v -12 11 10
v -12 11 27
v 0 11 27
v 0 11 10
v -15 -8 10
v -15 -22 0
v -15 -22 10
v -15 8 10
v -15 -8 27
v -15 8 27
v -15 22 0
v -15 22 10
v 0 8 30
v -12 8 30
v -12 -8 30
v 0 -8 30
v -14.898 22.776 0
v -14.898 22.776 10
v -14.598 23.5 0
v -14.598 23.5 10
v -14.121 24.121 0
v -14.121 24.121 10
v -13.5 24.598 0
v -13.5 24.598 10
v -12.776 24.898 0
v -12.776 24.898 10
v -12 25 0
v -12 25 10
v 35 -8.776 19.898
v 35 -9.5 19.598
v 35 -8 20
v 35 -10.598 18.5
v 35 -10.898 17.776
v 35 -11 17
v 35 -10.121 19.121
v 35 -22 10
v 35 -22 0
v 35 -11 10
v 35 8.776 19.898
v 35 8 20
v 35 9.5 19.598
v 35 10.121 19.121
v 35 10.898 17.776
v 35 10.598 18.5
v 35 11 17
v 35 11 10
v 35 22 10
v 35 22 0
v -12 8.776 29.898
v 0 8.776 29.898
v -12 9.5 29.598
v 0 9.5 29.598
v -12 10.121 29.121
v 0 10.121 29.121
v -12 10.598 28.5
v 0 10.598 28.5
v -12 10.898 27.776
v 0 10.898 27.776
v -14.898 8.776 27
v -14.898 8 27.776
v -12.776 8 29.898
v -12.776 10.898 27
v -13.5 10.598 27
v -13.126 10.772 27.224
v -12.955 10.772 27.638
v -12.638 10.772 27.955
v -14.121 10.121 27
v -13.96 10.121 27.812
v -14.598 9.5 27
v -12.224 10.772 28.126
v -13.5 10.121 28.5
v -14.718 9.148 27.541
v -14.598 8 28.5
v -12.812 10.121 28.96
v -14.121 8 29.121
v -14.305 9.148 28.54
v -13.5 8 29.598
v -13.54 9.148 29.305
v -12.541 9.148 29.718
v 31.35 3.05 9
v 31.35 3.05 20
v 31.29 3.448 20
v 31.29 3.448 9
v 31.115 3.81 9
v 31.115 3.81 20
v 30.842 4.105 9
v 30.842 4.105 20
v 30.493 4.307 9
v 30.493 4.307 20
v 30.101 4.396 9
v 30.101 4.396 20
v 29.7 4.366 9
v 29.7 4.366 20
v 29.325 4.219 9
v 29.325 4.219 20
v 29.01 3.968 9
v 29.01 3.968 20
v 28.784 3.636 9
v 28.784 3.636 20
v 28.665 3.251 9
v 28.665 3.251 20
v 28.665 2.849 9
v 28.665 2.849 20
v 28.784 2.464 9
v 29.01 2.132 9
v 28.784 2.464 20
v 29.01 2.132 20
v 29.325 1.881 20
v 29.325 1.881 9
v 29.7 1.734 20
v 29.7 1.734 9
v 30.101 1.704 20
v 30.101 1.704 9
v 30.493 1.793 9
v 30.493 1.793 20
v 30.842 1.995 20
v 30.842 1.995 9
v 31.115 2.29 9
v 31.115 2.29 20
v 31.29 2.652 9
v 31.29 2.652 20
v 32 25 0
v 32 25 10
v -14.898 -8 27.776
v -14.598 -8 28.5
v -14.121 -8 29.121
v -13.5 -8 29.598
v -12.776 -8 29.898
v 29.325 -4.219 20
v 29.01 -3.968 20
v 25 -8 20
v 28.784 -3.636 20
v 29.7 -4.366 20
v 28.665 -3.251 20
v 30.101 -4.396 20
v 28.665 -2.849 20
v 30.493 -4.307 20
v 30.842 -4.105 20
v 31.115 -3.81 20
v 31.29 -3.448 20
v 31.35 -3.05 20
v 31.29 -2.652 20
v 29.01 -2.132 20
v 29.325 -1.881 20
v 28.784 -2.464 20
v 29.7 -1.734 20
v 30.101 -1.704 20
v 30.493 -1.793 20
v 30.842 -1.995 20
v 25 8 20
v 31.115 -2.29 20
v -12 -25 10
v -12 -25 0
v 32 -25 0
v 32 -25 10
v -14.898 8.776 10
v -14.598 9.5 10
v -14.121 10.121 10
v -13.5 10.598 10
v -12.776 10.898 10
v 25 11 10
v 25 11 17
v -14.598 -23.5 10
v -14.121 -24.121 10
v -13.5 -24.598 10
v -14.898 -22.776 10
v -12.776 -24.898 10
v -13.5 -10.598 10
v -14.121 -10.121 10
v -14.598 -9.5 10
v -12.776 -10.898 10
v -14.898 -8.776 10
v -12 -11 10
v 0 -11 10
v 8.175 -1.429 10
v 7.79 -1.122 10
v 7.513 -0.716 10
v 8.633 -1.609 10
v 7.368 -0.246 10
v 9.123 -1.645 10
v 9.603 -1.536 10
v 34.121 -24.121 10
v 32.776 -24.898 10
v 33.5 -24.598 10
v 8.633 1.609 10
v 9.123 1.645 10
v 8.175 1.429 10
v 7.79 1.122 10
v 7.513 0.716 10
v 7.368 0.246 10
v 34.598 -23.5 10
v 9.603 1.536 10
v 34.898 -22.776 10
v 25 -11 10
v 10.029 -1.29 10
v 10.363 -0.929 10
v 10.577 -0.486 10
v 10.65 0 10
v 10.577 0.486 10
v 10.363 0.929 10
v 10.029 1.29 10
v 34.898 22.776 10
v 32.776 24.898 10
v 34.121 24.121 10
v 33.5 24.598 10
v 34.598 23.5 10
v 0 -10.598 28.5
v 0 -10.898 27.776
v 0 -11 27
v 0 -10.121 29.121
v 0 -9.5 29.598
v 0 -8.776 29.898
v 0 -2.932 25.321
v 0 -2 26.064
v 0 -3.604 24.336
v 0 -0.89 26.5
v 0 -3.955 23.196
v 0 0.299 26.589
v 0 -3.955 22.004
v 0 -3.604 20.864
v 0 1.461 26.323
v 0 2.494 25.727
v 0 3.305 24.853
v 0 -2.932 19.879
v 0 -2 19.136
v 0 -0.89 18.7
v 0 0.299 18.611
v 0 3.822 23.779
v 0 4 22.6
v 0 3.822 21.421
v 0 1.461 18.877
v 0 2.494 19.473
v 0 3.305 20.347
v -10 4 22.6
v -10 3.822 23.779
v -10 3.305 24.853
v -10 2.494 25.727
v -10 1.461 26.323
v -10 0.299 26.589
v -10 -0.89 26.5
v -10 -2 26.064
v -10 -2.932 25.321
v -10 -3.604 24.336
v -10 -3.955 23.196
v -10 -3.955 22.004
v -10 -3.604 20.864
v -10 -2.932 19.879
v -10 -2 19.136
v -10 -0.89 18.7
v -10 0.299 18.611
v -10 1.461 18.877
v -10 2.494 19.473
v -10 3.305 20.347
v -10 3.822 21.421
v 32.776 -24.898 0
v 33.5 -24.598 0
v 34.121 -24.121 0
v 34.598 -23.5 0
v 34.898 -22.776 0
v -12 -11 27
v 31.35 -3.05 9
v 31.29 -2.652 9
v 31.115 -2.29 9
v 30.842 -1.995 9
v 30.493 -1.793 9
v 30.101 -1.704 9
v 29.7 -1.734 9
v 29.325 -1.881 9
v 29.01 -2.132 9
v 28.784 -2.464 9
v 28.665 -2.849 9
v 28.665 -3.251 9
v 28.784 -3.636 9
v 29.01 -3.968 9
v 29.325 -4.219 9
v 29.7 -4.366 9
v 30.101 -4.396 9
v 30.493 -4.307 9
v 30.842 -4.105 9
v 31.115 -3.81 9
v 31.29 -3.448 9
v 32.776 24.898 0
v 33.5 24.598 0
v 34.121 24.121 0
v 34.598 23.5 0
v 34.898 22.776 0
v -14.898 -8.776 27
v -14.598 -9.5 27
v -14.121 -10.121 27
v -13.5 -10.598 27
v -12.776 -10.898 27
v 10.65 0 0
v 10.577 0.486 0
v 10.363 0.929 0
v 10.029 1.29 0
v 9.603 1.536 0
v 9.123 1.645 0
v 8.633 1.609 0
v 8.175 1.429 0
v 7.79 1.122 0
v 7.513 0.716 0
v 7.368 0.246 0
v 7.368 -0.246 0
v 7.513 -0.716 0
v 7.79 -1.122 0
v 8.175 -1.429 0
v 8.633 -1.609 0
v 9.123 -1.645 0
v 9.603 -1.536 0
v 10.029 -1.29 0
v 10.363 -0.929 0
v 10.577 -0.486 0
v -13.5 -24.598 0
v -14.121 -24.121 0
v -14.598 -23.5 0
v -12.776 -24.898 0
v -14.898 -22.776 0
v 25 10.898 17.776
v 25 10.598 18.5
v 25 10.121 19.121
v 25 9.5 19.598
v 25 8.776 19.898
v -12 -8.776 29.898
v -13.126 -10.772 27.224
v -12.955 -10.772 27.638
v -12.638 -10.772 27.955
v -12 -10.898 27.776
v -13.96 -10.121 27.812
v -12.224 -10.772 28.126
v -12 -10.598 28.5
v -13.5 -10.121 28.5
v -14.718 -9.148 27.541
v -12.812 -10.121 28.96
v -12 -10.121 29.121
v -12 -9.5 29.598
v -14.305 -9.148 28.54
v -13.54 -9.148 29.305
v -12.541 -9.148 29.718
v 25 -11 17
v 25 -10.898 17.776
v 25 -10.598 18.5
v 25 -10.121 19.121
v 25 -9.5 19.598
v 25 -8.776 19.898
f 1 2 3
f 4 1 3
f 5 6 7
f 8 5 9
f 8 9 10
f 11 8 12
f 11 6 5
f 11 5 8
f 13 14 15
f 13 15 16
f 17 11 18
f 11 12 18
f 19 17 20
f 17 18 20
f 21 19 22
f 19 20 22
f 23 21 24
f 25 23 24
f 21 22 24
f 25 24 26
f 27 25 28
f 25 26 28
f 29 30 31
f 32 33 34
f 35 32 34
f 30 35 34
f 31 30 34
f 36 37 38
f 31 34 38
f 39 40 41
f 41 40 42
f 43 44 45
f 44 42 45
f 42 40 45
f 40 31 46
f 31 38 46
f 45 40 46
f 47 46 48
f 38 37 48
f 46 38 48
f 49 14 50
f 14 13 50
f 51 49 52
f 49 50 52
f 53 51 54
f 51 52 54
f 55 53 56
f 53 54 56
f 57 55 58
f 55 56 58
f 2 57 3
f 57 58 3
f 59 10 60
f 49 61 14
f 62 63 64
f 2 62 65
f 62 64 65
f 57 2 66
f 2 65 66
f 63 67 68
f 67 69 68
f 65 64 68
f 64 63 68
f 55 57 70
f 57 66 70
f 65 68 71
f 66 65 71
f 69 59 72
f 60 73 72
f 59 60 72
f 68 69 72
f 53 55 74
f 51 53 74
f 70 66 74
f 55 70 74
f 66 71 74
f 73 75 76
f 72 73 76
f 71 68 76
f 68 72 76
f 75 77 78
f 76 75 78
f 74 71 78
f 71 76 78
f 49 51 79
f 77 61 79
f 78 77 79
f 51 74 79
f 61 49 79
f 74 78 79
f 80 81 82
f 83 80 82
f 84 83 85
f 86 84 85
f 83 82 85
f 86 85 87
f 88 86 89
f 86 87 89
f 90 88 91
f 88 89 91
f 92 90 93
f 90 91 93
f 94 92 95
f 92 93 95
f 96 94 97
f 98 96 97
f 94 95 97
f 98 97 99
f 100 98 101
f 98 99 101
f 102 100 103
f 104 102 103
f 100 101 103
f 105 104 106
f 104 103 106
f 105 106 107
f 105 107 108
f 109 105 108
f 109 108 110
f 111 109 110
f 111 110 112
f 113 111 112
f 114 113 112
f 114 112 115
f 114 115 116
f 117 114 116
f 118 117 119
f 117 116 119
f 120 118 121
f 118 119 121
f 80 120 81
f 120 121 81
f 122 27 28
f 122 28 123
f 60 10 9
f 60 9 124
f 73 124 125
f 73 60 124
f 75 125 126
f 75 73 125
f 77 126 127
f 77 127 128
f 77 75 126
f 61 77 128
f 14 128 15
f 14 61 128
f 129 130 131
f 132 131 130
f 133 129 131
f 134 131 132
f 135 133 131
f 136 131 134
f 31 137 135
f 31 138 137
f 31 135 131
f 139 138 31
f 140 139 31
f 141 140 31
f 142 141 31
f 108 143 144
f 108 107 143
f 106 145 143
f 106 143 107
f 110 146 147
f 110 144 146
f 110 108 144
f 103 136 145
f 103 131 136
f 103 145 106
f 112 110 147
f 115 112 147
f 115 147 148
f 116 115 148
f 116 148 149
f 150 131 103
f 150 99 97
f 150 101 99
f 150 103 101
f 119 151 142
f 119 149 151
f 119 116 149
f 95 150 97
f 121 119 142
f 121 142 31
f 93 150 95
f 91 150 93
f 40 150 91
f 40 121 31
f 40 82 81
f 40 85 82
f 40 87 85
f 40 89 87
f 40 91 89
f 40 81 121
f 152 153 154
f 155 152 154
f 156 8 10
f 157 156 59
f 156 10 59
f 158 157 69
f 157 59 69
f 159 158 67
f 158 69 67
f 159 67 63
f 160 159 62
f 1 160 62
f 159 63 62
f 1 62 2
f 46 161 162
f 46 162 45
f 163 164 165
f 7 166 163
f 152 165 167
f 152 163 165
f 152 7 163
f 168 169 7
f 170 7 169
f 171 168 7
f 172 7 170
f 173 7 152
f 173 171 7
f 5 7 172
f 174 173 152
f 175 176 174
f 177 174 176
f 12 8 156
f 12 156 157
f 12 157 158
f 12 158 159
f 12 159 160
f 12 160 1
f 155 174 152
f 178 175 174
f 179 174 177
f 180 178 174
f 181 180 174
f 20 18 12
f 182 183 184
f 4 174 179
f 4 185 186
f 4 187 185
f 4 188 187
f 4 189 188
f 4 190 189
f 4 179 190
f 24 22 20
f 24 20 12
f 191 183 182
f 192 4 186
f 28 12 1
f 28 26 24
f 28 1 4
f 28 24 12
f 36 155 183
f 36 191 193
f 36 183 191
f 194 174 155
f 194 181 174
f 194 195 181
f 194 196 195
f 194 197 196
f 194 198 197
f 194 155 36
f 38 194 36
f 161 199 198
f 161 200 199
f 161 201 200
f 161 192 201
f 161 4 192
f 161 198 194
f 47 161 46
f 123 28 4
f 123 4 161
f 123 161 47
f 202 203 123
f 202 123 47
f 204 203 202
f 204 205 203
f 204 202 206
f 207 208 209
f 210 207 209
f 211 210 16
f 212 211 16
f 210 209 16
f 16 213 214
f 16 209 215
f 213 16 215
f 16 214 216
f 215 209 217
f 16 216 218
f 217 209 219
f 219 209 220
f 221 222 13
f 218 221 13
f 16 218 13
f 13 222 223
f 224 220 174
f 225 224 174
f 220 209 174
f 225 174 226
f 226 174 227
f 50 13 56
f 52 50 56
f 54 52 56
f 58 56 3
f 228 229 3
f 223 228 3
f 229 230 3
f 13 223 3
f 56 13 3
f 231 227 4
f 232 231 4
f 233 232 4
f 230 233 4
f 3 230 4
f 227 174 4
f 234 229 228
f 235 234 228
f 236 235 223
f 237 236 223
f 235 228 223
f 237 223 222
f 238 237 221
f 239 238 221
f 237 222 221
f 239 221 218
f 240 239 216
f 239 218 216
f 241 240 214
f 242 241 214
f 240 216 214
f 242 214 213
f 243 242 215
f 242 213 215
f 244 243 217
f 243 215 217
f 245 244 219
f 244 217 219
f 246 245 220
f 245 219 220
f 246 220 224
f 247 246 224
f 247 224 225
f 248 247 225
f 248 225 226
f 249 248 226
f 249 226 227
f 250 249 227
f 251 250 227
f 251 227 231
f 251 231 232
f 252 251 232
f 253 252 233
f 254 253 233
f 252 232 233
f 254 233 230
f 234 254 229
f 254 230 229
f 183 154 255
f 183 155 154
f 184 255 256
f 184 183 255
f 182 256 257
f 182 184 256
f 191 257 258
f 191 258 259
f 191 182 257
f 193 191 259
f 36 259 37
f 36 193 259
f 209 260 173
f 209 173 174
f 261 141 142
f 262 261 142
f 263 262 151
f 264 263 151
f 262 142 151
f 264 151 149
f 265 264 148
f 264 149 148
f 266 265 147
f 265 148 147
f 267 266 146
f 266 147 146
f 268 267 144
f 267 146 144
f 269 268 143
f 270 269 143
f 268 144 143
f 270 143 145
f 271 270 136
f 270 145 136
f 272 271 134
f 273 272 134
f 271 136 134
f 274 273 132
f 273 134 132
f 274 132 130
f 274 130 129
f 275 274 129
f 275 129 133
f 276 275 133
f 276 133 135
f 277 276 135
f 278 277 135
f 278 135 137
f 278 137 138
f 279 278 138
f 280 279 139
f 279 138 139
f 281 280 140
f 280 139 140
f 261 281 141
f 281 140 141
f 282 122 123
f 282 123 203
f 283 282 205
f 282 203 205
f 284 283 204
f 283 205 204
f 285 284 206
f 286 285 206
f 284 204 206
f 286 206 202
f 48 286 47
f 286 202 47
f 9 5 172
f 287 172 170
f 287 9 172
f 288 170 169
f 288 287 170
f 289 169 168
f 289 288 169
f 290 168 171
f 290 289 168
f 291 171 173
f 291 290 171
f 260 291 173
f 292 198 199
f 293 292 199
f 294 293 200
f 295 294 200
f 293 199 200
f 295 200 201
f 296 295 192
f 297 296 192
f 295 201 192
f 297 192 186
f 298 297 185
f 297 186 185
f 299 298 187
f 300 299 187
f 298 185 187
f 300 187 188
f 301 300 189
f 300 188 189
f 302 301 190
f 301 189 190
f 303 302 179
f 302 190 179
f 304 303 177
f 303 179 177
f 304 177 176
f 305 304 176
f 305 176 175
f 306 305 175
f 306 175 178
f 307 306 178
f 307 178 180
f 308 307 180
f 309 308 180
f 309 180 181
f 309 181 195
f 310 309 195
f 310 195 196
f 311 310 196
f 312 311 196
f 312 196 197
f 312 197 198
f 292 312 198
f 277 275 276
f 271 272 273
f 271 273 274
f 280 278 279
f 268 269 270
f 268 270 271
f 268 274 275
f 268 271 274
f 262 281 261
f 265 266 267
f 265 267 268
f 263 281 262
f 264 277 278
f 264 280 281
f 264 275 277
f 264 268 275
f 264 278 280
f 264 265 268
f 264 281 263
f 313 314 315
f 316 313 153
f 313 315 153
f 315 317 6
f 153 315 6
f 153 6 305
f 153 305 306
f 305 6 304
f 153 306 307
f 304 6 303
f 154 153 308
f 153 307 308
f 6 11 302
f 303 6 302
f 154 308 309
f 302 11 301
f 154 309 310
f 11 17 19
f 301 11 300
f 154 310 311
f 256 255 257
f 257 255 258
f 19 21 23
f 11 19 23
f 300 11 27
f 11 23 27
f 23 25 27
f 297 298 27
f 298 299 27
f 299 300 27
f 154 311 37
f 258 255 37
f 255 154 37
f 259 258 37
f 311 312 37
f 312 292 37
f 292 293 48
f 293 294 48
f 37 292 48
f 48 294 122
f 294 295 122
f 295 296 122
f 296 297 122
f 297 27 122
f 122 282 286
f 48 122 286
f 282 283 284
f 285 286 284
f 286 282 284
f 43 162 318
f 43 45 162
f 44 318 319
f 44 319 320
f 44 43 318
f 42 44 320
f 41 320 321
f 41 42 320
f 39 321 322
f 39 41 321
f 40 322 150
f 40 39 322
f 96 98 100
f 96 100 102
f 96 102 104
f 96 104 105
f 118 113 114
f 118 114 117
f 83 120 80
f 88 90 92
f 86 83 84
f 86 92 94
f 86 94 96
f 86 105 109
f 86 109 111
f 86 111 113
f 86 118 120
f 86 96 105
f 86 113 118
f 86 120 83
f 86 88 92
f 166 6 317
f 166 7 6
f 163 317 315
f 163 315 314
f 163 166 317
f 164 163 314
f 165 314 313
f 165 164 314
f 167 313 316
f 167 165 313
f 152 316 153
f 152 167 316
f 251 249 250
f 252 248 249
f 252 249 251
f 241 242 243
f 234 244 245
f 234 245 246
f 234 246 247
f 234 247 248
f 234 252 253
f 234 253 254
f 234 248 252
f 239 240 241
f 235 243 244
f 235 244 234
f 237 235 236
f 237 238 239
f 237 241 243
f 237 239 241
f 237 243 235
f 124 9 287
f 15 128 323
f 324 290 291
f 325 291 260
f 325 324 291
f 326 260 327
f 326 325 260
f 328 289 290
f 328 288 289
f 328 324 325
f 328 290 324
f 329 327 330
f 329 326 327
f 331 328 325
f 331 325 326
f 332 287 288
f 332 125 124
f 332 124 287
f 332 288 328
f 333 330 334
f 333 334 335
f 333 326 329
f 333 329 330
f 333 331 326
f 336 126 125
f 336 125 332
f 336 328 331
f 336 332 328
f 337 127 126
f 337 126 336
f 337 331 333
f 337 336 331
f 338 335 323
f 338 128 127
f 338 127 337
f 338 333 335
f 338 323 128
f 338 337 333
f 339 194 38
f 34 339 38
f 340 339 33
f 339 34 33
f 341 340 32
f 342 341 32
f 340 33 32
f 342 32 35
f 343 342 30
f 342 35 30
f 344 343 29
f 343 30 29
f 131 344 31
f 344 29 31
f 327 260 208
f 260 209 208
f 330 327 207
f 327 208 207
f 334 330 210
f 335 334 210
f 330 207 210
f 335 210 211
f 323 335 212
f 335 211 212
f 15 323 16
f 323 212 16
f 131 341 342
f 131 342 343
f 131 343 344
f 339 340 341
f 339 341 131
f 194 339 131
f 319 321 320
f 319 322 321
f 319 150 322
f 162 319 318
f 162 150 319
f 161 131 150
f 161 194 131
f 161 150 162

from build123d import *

# Parameters (mm, degrees)
F0_W      = 50
F0_H      = 50
F1_DEPTH  = 10
F2_W      = 15
F2_H      = 22
F3_DEPTH  = 20
F4_R      = 4
F5_DEPTH  = 10
F6_R      = 1.65
F7_DEPTH  = 10.001
F8_W      = 10
F8_H      = 22
F9_DEPTH  = 10
F10_R     = 1.35
F11_DEPTH = 11
F12_R     = 3


with BuildPart() as f1:
    # F0 (on Top) → F1 (new body)
    with BuildSketch(Plane.XY):
        with Locations((10, 0)):
            Rectangle(F0_W, F0_H)
    extrude(amount=F1_DEPTH)

    # F2 (on face) → F3 (join)
    with BuildSketch(Plane.XY.offset(10)):
        with Locations((-7.5, 0)):
            Rectangle(F2_W, F2_H)
    extrude(amount=F3_DEPTH)

    # F4 (on face) → F5 (cut)
    with BuildSketch(Plane.YZ):
        with Locations((0, 22.6)):
            Circle(F4_R)
    extrude(amount=-F5_DEPTH, mode=Mode.SUBTRACT)

    # F6 (on face) → F7 (cut, through all)
    with BuildSketch(Plane.XY.offset(10)):
        with Locations((9, 0)):
            Circle(F6_R)
    extrude(amount=-F7_DEPTH, mode=Mode.SUBTRACT)

    # F8 (on face) → F9 (join)
    with BuildSketch(Plane.XY.offset(10)):
        with Locations((30, 0)):
            Rectangle(F8_W, F8_H)
    extrude(amount=F9_DEPTH)

    # F10 (on face) → F11 (cut)
    with BuildSketch(Plane.XY.offset(20)):
        with Locations((30, 3.05)):
            Circle(F10_R)
        with Locations((30, -3.05)):
            Circle(F10_R)
    extrude(amount=-F11_DEPTH, mode=Mode.SUBTRACT)

    # F12
    f12_edges = [f1.edges().sort_by_distance(p)[0] for p in [
        (-15, 0, 30),
        (-15, -25, 5),
        (35, -25, 5),
        (35, 25, 5),
        (-15, 25, 5),
        (-15, 11, 20),
        (-15, -11, 20),
        (-7.5, 11, 30),
        (-7.5, -11, 30),
        (30, 11, 20),
        (30, -11, 20),
    ]]
    fillet(f12_edges, radius=F12_R)


solid = f1.part
